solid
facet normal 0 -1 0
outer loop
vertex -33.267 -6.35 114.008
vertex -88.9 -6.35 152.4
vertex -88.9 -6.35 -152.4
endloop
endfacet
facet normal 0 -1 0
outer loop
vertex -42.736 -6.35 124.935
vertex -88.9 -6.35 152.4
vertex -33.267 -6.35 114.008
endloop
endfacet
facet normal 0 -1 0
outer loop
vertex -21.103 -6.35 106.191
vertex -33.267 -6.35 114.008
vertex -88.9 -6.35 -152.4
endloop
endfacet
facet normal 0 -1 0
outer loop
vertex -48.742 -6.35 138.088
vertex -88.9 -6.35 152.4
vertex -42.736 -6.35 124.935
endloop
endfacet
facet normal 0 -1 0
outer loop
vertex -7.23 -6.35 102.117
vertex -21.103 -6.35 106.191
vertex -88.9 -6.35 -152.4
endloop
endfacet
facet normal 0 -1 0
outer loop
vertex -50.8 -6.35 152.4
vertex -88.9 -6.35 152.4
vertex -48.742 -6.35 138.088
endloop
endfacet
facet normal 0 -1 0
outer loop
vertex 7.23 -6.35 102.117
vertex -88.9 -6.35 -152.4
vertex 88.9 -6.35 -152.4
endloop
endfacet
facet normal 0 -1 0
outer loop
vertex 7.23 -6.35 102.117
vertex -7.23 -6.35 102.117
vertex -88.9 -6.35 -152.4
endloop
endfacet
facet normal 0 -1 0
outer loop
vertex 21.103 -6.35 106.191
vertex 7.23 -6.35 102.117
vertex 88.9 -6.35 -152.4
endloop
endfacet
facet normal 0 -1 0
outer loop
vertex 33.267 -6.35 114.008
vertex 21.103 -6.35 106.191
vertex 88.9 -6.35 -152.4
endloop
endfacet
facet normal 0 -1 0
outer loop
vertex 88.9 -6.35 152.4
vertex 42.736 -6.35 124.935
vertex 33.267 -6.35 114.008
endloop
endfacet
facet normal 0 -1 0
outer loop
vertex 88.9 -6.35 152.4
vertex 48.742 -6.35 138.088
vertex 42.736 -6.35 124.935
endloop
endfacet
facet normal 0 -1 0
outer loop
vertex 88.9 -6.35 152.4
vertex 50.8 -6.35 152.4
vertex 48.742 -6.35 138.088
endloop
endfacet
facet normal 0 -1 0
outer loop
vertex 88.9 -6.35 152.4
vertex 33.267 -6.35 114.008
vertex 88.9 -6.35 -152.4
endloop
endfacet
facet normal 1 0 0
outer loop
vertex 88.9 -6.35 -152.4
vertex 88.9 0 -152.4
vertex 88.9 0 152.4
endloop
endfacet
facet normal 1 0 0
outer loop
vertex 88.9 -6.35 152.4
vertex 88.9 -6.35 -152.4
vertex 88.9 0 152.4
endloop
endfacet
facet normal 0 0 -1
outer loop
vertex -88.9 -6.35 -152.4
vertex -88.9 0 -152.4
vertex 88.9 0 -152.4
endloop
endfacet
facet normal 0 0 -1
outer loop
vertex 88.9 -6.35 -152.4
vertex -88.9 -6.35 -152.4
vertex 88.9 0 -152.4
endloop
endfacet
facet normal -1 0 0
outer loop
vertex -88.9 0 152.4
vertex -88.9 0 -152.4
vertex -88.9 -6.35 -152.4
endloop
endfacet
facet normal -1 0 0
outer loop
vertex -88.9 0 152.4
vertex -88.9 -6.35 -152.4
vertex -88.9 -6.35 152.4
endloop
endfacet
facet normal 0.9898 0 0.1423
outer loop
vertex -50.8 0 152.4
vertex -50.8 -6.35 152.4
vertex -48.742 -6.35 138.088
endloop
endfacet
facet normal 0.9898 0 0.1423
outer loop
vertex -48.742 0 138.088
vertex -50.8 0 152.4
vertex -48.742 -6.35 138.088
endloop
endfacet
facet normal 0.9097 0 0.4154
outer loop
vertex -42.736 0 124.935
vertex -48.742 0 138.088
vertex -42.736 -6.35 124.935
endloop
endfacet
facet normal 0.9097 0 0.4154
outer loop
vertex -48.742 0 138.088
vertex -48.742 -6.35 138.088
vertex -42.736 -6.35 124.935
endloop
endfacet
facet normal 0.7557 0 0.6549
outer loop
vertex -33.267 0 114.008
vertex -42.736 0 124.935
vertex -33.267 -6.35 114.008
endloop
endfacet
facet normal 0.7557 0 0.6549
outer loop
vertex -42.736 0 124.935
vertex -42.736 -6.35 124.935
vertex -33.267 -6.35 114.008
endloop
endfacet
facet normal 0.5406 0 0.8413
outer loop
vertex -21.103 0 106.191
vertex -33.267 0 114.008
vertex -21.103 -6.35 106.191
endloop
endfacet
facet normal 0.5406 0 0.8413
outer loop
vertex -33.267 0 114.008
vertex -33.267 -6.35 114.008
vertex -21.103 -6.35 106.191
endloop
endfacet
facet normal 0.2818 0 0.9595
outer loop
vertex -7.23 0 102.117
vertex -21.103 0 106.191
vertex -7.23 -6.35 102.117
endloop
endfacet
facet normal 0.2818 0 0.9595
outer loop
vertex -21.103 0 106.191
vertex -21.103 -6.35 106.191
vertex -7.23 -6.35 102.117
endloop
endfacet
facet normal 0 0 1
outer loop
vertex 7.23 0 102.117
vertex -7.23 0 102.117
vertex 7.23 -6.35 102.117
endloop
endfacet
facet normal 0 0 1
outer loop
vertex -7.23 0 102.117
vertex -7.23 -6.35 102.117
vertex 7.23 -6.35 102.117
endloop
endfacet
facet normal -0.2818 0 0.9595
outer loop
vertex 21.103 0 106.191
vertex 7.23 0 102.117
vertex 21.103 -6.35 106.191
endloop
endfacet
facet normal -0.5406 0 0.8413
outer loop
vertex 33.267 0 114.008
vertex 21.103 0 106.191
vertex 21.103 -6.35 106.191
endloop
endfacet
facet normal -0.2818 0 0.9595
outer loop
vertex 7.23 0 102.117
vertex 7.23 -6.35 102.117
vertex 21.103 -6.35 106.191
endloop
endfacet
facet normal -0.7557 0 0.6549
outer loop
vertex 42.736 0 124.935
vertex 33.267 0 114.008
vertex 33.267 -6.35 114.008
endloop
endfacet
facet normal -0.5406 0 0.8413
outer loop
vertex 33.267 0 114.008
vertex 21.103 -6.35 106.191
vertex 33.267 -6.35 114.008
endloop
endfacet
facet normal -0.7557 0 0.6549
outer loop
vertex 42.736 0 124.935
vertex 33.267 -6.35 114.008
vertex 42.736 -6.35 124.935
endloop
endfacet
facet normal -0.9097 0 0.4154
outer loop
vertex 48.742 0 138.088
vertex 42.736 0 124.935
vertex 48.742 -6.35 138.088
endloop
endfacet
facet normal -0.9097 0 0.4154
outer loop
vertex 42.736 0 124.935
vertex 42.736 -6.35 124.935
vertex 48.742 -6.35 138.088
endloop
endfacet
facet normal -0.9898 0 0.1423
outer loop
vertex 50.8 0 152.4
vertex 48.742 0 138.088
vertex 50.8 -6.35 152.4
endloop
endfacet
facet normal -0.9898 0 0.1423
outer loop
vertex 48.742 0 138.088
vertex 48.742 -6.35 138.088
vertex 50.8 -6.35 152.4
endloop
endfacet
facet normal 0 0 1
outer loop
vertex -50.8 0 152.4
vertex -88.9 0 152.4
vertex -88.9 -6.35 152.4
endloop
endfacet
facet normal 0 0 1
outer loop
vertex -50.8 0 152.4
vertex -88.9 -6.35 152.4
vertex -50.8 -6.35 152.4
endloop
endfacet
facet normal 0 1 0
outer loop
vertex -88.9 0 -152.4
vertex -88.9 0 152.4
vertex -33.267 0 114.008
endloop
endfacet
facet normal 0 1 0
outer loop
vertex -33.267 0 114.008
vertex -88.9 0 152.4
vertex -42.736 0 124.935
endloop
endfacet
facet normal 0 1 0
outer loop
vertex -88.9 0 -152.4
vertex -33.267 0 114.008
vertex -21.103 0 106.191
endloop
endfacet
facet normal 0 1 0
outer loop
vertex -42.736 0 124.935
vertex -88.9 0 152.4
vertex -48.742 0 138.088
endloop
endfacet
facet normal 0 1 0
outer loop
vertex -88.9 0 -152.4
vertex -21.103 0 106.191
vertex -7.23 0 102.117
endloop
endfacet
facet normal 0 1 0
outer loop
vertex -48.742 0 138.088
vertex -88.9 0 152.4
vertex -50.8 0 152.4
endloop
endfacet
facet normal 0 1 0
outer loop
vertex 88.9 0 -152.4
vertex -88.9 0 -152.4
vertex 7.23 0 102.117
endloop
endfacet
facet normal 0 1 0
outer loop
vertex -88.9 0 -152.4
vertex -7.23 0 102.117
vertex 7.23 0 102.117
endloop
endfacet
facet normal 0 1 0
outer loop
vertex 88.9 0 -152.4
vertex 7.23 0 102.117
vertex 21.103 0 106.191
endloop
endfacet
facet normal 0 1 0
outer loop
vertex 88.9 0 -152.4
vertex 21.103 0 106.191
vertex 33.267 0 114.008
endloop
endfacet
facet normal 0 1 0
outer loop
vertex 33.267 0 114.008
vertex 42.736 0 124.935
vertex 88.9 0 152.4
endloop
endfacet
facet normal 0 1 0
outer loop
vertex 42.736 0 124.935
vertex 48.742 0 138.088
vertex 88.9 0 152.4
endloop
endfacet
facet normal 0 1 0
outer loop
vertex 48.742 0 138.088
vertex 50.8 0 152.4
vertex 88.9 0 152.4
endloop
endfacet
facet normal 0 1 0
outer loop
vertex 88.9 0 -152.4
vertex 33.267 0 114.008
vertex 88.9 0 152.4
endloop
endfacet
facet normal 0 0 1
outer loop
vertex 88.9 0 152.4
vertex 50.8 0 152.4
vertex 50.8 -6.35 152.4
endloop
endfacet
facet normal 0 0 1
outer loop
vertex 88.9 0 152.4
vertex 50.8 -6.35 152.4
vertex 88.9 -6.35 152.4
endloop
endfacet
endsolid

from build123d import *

# Parameters (mm, degrees)
F0_W     = 177.8
F0_H     = 304.8
F1_DEPTH = 6.35
F3_DEPTH = 25.4


with BuildPart() as f1:
    # F0 (on Front) → F1 (new body)
    with BuildSketch(Plane.XZ):
        Rectangle(F0_W, F0_H)
    extrude(amount=F1_DEPTH)

    # F2 (on face) → F3 (cut)
    with BuildSketch(Plane.XZ.offset(6.35)):
        with BuildLine():
            Line((50.8, 152.4), (-50.8, 152.4))
            ThreePointArc((-50.8, 152.4), (0, 101.6), (50.8, 152.4))
        make_face()
    extrude(amount=-F3_DEPTH, mode=Mode.SUBTRACT)


solid = f1.part
